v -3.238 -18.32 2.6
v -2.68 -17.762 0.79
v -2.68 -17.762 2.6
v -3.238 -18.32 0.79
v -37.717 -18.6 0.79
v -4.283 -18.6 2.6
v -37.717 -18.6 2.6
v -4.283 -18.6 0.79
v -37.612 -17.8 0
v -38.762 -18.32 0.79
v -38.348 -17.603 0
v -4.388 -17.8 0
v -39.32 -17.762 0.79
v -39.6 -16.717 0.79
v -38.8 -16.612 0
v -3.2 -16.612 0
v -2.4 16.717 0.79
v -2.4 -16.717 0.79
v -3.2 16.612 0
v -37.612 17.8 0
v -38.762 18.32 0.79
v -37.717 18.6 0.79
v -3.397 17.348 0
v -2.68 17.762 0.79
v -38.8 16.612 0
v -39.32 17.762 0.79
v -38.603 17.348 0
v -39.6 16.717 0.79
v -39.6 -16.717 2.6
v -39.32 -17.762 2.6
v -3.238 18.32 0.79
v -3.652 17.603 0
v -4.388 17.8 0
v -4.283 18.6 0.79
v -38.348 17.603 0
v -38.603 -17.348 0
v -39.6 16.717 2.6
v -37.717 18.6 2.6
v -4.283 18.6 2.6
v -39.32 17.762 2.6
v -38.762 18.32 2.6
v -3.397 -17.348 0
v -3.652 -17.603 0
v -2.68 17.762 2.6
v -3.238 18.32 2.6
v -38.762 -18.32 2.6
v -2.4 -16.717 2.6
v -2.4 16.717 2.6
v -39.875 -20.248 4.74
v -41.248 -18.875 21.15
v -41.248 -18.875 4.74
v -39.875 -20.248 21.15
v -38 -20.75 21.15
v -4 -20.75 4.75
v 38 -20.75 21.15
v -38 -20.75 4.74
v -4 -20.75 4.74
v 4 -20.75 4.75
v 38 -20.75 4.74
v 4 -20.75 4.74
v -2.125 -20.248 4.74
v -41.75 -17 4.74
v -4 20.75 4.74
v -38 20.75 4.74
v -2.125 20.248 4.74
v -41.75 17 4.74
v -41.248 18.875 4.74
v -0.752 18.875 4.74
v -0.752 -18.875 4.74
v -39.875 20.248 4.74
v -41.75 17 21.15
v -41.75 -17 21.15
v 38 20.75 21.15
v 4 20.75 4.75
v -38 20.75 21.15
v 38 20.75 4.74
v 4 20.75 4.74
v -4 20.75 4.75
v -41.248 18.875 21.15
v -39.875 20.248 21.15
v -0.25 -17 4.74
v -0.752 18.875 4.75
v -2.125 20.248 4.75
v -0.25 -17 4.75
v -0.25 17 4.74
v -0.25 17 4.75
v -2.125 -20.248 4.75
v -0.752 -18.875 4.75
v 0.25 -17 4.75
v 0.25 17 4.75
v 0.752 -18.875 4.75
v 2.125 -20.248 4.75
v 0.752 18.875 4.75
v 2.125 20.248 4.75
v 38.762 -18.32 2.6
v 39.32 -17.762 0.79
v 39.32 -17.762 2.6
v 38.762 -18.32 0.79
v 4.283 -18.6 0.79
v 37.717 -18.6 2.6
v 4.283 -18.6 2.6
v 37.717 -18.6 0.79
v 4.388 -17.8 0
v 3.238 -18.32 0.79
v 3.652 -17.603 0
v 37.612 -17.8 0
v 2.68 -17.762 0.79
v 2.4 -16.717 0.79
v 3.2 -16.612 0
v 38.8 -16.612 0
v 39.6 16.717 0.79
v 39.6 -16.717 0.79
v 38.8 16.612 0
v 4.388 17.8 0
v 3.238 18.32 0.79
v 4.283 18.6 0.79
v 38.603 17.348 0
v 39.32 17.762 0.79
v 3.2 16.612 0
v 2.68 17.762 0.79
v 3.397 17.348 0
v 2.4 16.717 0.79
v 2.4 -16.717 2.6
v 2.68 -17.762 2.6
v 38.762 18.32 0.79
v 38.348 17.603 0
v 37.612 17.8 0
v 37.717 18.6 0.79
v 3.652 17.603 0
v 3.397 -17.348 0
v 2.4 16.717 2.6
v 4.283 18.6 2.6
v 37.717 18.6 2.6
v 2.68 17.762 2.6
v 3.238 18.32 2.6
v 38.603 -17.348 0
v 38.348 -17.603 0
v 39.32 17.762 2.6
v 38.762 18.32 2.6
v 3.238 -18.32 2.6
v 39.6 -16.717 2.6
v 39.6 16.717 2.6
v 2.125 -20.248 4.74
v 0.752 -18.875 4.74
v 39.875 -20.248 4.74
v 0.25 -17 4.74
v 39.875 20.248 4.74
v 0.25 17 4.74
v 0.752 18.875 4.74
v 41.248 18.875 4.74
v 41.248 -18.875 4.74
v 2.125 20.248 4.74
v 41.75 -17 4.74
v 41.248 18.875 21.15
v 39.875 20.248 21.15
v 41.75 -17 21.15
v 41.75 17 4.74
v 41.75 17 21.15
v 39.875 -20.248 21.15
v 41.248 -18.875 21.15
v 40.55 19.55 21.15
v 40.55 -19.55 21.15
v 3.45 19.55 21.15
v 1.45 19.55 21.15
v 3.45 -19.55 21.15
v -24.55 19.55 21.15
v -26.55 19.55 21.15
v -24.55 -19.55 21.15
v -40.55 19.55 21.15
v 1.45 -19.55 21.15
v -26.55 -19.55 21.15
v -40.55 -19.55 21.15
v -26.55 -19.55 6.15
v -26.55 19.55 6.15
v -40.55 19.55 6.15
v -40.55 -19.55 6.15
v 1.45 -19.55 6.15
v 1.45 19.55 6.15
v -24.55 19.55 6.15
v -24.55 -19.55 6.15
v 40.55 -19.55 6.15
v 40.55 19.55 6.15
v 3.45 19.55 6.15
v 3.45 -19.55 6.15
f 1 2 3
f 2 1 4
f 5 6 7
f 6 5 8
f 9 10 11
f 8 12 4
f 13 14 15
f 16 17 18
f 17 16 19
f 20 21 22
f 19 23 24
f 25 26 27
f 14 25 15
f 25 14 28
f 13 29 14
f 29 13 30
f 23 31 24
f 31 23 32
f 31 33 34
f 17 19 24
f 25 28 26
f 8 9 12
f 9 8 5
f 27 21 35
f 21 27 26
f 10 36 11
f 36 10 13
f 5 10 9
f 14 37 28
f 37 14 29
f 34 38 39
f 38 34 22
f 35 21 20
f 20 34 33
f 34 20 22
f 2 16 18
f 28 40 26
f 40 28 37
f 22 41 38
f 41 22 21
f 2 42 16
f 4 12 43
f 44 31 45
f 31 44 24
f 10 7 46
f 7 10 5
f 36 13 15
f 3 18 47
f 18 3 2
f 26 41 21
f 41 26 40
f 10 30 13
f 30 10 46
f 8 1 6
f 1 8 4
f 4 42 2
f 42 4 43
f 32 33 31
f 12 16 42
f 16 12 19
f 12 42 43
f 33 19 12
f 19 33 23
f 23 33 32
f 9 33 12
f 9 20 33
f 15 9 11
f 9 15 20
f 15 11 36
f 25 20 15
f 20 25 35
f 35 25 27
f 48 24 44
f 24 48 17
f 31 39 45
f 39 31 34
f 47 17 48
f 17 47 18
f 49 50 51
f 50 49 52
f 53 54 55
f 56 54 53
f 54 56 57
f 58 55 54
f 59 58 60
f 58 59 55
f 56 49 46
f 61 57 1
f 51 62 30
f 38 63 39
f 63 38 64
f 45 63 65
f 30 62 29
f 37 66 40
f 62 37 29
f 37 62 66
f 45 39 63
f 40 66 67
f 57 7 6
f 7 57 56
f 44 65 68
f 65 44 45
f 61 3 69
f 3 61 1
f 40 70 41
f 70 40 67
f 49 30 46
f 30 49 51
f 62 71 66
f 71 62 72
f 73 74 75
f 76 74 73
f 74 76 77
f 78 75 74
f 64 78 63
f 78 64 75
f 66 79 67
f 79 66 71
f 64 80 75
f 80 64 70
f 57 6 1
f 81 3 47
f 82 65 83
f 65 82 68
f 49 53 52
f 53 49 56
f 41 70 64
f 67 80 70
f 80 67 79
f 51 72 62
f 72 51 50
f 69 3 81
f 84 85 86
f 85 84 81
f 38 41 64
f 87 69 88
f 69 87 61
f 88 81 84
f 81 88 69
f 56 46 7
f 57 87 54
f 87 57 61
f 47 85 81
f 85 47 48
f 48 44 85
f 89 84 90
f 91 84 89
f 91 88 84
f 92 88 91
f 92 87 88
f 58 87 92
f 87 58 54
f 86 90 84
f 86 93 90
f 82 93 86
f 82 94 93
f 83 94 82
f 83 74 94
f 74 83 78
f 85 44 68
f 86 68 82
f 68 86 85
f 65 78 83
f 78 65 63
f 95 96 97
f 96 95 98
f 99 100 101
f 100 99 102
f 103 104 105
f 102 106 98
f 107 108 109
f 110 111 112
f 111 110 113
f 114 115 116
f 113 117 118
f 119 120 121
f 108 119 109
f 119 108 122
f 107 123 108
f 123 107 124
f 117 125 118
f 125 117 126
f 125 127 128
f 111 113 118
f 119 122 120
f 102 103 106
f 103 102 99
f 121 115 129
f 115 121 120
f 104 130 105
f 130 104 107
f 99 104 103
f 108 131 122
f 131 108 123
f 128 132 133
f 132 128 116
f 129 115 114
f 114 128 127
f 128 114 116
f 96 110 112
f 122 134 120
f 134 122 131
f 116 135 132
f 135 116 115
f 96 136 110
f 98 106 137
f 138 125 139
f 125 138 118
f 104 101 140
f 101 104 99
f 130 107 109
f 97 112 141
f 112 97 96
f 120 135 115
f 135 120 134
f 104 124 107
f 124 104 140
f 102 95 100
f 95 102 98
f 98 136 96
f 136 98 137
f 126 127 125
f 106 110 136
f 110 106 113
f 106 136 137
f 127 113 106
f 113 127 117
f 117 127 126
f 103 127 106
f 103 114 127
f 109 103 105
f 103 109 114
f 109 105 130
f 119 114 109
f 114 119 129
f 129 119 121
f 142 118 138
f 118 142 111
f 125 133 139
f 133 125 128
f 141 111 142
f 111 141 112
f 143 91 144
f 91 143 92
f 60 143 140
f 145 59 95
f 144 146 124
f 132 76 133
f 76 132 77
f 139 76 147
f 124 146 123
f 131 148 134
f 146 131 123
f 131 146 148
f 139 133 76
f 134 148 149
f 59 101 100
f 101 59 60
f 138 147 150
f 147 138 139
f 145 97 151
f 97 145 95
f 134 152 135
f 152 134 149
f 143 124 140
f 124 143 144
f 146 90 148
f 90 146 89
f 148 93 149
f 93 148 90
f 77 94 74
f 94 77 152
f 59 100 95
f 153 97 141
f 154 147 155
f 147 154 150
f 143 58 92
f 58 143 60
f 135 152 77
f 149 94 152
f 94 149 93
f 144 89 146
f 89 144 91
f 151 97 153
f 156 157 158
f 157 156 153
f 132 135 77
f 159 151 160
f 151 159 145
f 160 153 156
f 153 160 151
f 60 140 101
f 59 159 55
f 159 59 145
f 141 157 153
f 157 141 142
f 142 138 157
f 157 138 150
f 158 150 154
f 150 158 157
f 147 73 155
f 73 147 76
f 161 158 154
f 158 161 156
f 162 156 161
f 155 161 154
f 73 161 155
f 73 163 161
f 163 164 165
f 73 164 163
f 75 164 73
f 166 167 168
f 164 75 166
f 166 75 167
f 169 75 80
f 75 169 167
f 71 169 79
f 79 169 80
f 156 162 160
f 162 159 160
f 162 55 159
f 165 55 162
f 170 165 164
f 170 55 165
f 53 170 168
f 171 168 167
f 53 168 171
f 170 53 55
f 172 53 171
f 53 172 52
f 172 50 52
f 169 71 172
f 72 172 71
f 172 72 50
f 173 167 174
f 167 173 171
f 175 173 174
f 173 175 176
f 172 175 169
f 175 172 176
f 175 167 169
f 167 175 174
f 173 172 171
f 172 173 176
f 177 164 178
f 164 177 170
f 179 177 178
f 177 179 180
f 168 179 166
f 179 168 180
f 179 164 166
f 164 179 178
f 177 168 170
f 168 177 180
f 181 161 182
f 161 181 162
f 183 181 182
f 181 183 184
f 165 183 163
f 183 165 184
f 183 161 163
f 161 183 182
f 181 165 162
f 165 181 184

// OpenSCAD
// bin_accessories_engraver — 2×1 bin for the ENGRAVER's non-shank accessories:
// the square bit box, the wheels, and an open bay.
//
// WHY IT EXISTS. `bin_bits_engraver` is a drilled block and only takes
// shank-mounted pieces. The box and the wheels are not that — wheels are
// mandrel-mounted and want a pocket, not a bore.
//
// THREE ZONES, full depth in Y:
//
//   BOX    14 mm — the 13 × 13 box plus 1 mm. One box; it can slide fore-aft in
//                  the zone, which does not matter for a rigid cube.
//   DISCS  26 mm — cut-off wheels AND sanding disks together, stacked flat like
//                  coins. Both are flat circles of the same order, so splitting
//                  them into two pockets would just waste width.
//   BAY    37.1 mm × 39.1 — spare, for whatever else turns up.
//
// The collet wrench is the HARDELL's, not this tool's, and is not accounted for
// here.
//
// PRINT: as emitted, feet down. No supports.
//
// SPDX-License-Identifier: CC-BY-NC-4.0
// Copyright (c) 2026 Aaron Cupp
include <../lib/gridfinity.scad>

/* [Contents] */
BOX_SZ   = 13.0;   // [8:0.5:30] square bit box, measured — 1 off
BOX_CLR  = 1.0;    // [0.5:0.1:2]
DISC_D   = 25.0;   // [10:1:40] largest wheel, measured
DISC_CLR = 1.0;    // [0.5:0.1:2]

/* [Bin] */
NX = 2; NY = 1;
DEPTH = 15;        // [8:1:40] "25-ish wide and 15 tall should be more than
                   //   enough" — the wheels' own spec, so the stack sits near
                   //   the rim rather than 3 mm down where it is hard to pinch
WALL  = 1.2;
FLOOR = 1.4;
DIV   = 2.0;       // [1.2:0.2:4]

H  = BIN_BASE_H + FLOOR + DEPTH;
W  = NX*GF - 0.5;  D = NY*GF - 0.5;
IW = W - 2*WALL;   ID = D - 2*WALL;
Z0 = BIN_BASE_H + FLOOR;

BOX_W  = BOX_SZ + BOX_CLR;
DISC_W = DISC_D + DISC_CLR;
BAY_W  = IW - BOX_W - DISC_W - 2*DIV;

assert(BAY_W >= 20, str("Open bay collapses to ", BAY_W,
                        " mm — nothing useful fits beside the pockets."));
assert(DISC_W < ID, "Disc pocket is deeper than the bin interior.");
echo(str("box ", BOX_W, " | discs ", DISC_W, " | bay ", BAY_W, " x ", ID,
         " (diagonal ", sqrt(BAY_W*BAY_W + ID*ID), ")"));

difference() {
    bin_blank(NX, NY, H);
    // zone 1 — the bit box
    translate([-IW/2, -ID/2, Z0]) cube([BOX_W, ID, DEPTH + 0.1]);
    // zone 2 — wheels, stacked flat
    translate([-IW/2 + BOX_W + DIV, -ID/2, Z0]) cube([DISC_W, ID, DEPTH + 0.1]);
    // zone 3 — open bay, spare
    translate([-IW/2 + BOX_W + DISC_W + 2*DIV, -ID/2, Z0])
        cube([BAY_W, ID, DEPTH + 0.1]);
}
